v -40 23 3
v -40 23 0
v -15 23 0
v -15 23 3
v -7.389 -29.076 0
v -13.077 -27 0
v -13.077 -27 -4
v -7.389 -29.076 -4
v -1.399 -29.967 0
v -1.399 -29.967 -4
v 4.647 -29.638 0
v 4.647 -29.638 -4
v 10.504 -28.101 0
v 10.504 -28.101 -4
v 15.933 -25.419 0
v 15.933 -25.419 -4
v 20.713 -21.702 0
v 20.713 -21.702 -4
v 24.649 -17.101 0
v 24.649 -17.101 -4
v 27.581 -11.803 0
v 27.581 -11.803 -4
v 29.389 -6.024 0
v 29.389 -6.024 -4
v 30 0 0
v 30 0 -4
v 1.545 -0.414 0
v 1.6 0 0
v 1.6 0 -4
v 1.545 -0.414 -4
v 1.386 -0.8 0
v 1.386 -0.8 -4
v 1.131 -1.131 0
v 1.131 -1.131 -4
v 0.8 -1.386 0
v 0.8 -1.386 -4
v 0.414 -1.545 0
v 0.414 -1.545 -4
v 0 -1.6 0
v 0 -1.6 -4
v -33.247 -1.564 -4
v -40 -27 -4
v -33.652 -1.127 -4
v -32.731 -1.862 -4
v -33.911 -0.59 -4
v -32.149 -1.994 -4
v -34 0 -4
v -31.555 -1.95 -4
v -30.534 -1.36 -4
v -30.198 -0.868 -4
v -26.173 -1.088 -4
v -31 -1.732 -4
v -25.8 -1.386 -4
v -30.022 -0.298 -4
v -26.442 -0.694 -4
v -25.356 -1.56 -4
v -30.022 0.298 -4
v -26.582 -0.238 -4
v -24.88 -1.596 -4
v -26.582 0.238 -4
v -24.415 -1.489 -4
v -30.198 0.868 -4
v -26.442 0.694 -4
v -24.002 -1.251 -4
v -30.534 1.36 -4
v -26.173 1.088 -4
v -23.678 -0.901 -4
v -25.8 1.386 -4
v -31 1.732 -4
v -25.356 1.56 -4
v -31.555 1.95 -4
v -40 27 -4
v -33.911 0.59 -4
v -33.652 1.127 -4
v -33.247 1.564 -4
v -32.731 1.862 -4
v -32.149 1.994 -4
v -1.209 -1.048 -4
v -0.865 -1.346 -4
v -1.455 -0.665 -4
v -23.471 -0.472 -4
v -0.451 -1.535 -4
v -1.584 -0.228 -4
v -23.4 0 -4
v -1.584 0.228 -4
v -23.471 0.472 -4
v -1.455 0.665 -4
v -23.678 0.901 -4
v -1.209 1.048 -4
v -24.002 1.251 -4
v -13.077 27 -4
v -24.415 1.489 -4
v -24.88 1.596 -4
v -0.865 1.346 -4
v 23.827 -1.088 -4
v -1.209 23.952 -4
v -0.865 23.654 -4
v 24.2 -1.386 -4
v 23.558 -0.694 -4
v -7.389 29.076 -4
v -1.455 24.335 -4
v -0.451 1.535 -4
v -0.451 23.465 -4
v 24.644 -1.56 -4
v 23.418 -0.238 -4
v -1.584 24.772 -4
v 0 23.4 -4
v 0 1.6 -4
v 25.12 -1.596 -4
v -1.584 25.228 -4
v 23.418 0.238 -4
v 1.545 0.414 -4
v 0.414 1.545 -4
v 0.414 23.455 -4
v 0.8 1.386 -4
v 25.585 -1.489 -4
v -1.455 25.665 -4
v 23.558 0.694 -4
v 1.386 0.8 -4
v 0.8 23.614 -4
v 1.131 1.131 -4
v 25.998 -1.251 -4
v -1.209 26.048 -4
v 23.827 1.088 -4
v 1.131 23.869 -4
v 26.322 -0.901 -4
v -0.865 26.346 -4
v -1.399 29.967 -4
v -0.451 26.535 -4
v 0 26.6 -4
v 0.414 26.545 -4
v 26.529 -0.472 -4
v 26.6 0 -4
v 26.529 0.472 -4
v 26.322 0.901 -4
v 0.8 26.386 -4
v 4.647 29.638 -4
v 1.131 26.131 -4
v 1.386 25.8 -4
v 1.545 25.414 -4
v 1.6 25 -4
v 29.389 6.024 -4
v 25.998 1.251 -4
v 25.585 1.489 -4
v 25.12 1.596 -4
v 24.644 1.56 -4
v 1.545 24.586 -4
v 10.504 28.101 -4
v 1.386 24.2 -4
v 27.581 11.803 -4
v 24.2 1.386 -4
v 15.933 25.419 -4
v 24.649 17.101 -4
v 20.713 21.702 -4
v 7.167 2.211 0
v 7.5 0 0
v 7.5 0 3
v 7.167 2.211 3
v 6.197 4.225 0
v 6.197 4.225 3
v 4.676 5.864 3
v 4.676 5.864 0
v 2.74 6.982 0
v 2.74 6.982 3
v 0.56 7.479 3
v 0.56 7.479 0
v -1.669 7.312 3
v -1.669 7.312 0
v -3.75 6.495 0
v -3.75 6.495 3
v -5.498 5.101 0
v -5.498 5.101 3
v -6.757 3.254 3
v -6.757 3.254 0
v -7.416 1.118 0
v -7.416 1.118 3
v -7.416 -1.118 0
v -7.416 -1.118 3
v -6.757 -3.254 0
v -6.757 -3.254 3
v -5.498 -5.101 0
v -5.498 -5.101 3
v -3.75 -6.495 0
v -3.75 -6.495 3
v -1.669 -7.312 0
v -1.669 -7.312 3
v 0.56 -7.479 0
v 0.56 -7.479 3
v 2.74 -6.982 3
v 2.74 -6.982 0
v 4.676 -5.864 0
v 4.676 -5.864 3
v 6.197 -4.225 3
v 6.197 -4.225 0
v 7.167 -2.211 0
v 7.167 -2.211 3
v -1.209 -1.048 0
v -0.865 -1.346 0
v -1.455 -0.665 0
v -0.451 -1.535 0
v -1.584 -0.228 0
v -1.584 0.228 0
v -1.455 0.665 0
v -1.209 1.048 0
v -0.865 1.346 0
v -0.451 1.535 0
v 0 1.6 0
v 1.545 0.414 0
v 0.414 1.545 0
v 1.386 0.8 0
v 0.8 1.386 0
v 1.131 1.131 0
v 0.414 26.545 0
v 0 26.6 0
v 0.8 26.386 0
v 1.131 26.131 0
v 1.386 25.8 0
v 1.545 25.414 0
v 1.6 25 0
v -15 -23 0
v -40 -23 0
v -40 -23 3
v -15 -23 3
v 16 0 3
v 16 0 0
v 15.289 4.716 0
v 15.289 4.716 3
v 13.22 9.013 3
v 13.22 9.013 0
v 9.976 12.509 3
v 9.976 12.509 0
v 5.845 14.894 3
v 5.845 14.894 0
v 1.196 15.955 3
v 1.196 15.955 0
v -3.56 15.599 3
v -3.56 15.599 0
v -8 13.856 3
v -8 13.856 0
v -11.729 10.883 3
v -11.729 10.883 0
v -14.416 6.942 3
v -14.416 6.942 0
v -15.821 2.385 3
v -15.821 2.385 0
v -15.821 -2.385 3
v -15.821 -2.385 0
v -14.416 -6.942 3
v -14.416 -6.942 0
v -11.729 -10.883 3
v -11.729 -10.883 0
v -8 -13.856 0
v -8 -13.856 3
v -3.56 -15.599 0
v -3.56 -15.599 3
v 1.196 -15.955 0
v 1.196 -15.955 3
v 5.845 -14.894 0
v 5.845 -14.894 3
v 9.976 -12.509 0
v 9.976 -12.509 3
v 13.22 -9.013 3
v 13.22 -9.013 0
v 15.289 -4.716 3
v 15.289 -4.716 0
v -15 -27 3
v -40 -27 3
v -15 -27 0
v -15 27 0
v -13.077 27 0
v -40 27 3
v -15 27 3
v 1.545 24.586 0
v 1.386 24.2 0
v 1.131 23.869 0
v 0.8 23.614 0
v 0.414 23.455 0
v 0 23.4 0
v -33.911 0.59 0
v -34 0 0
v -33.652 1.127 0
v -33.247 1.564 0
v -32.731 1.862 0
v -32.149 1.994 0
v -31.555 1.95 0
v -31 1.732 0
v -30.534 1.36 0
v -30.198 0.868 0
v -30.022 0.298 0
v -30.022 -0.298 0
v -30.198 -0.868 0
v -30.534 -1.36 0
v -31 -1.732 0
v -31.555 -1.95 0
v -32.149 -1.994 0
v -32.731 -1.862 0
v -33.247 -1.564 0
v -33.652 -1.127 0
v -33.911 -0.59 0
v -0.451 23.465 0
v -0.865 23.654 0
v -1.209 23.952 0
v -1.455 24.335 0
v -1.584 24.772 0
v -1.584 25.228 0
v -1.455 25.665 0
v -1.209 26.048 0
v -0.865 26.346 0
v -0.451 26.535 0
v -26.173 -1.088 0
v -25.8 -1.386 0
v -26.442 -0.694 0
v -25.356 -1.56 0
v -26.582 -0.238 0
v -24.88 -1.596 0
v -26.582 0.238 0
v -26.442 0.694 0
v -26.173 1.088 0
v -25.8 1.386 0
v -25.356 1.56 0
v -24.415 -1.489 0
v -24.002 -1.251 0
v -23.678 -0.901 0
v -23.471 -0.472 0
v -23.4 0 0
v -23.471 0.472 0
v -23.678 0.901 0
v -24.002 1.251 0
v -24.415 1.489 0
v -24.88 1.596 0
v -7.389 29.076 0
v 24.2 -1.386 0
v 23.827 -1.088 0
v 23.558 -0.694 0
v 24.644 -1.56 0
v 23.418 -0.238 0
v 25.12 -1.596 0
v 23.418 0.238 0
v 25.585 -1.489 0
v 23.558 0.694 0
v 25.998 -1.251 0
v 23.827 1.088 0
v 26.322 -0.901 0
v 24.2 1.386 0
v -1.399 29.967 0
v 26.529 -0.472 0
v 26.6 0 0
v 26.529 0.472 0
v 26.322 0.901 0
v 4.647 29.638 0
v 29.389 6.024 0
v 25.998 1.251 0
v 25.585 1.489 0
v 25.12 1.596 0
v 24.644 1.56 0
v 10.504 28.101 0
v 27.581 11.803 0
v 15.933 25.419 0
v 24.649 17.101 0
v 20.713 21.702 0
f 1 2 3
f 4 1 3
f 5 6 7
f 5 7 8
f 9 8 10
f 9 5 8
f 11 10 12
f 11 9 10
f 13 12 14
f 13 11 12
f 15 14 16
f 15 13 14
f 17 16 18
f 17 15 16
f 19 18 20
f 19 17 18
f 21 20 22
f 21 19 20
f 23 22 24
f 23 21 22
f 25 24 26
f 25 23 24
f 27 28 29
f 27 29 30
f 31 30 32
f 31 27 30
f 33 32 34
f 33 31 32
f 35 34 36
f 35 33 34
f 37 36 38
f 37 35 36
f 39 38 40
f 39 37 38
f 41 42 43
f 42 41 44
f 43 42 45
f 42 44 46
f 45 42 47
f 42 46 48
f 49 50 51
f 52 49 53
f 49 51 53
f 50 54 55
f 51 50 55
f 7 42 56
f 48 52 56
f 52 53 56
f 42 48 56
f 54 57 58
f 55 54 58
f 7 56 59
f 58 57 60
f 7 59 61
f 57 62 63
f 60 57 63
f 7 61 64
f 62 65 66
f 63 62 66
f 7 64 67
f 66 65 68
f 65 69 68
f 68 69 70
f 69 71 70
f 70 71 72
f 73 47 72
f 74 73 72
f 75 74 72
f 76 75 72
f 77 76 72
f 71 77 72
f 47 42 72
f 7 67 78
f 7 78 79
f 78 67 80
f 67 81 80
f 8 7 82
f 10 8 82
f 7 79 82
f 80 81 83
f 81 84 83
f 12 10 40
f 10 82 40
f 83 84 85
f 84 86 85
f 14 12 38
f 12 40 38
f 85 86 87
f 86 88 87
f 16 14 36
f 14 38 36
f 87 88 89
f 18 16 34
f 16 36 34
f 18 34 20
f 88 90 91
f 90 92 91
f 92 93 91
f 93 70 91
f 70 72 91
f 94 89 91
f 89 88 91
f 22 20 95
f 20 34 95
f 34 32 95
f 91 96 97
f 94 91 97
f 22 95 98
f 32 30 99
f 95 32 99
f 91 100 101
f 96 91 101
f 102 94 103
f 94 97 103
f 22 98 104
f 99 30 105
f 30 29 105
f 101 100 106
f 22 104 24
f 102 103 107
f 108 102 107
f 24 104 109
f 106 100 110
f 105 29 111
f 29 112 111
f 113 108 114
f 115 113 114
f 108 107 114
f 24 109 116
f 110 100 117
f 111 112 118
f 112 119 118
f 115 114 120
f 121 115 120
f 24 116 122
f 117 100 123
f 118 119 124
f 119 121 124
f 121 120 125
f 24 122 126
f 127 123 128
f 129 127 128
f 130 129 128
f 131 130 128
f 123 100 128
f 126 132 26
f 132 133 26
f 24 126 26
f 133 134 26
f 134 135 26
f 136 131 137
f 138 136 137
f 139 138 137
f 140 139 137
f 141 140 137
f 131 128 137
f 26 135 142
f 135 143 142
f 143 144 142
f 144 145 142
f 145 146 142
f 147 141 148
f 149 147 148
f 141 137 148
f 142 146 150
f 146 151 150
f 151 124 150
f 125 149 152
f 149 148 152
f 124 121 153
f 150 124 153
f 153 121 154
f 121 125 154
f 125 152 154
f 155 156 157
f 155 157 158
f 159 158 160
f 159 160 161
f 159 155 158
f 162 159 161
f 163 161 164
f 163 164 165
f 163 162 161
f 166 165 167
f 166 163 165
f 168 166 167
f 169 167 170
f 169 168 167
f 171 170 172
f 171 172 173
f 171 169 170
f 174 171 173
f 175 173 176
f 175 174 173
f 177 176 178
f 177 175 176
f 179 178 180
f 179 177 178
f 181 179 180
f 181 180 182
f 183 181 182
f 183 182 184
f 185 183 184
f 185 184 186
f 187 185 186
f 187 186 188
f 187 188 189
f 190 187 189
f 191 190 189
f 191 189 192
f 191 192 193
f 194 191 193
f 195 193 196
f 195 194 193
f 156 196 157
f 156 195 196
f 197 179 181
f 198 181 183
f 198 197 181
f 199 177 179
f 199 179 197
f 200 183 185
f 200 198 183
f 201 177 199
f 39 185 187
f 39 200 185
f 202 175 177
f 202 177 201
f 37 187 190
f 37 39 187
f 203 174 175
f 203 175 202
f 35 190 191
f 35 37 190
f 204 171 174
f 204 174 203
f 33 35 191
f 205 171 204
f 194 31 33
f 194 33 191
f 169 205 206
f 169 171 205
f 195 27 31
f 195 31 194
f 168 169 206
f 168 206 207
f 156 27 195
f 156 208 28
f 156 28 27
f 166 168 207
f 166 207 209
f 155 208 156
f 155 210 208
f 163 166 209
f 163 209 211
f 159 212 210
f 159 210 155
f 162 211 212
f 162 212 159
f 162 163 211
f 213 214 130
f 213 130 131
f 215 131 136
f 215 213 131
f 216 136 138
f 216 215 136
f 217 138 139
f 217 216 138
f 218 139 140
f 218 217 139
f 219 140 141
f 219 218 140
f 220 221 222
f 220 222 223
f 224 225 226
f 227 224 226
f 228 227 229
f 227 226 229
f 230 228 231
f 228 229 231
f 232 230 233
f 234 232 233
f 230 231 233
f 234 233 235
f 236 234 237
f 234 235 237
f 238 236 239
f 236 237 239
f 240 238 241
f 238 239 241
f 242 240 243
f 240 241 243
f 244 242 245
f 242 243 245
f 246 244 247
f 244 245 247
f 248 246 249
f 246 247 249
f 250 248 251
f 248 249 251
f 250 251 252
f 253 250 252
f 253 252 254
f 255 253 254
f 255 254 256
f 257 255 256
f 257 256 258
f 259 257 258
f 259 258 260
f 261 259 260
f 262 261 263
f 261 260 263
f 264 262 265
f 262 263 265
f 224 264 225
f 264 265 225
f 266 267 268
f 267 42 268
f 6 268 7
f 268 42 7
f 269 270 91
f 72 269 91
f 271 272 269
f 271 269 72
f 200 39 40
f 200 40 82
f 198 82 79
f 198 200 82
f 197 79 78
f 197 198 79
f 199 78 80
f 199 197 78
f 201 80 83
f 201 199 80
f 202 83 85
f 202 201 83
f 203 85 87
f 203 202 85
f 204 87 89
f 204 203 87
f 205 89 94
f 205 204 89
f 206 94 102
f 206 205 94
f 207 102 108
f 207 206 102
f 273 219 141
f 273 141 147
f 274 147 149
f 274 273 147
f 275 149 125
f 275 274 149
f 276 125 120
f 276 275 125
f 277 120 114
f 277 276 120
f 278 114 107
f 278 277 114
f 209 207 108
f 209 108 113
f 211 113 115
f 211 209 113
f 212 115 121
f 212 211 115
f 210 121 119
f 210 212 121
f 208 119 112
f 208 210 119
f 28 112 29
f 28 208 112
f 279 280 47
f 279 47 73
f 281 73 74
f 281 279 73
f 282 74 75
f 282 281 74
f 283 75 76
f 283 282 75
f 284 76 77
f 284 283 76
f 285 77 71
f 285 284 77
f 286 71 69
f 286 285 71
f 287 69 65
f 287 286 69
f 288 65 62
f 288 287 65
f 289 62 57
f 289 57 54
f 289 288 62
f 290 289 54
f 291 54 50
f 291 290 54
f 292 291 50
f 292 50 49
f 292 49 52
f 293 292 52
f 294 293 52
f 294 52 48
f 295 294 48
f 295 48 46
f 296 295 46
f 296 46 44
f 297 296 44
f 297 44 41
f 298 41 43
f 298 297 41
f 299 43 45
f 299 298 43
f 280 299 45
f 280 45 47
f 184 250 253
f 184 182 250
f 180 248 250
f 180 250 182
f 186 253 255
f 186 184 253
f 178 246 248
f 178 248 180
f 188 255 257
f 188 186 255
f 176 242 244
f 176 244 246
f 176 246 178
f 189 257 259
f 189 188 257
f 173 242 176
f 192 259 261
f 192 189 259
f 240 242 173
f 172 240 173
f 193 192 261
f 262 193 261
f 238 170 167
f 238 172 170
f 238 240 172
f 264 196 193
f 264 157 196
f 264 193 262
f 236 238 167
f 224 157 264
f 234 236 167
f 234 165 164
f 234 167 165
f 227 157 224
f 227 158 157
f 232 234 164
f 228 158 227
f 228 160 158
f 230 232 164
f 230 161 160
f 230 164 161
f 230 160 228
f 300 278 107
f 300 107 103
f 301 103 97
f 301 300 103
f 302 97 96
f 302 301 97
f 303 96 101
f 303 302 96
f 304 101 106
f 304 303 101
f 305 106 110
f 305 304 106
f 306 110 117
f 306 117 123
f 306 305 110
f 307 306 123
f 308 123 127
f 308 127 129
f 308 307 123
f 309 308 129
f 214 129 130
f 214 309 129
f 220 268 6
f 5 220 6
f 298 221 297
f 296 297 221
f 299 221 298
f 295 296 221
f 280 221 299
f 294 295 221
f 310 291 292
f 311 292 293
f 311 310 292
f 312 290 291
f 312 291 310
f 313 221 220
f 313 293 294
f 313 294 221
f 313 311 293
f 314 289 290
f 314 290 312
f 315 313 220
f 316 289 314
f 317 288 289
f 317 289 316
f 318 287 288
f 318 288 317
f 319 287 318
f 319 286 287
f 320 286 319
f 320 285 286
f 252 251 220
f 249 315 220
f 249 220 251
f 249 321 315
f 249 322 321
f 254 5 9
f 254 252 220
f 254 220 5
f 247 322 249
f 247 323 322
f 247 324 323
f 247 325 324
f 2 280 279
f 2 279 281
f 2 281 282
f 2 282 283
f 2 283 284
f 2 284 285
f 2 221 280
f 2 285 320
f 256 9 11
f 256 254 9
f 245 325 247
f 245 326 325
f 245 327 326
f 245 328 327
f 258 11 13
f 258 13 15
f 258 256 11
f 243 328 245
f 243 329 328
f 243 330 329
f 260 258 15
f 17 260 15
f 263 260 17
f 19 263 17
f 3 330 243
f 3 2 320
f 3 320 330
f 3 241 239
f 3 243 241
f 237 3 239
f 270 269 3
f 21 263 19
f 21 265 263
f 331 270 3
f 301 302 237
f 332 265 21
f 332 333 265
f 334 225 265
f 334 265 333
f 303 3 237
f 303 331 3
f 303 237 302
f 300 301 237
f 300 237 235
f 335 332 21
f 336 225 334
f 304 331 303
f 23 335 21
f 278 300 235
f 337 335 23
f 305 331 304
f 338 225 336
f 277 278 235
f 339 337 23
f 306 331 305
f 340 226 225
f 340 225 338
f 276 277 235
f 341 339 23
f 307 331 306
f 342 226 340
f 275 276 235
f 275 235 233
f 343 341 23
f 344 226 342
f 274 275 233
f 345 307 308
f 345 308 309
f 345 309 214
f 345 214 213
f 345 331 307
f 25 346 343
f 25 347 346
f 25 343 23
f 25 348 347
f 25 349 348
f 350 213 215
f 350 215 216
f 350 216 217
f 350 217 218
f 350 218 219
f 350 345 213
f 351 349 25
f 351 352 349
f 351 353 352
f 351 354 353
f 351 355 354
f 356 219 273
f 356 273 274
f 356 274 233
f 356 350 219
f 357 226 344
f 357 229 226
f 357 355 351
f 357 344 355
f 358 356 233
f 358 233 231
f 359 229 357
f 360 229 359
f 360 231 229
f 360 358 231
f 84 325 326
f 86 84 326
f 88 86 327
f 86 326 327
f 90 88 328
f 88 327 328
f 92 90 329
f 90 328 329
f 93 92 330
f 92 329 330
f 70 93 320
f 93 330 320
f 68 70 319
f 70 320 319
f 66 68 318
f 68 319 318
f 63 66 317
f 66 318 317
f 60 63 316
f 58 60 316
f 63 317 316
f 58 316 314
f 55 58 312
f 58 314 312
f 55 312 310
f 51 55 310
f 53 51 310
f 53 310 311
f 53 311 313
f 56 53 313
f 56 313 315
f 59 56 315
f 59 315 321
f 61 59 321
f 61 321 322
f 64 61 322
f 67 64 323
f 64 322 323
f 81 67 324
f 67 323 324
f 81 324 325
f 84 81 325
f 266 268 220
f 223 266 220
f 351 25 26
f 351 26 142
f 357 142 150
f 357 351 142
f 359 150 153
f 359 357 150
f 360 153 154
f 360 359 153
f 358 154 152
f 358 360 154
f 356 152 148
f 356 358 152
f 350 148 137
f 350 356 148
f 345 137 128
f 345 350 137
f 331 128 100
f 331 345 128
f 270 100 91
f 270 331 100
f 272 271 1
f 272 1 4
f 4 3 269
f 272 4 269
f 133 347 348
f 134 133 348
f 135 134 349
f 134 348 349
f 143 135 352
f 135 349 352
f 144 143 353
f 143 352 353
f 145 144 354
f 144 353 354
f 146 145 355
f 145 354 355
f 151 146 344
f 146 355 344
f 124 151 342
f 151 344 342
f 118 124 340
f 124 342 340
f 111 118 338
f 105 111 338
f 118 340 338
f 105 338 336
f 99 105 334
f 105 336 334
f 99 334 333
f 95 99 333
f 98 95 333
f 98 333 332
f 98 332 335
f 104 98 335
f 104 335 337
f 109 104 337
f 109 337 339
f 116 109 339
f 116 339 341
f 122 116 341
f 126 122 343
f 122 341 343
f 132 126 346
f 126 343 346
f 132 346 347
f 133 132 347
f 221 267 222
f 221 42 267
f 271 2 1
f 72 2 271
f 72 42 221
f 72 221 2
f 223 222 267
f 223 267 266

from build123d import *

# Parameters (mm, degrees)
F0_R     = 1.6
F1_DEPTH = 4
F2_R     = 16
F2_R_2   = 7.5
F2_W     = 25
F2_H     = 4
F3_DEPTH = 3


with BuildPart() as f1:
    # F0 (on Top) → F1 (new body)
    with BuildSketch(Plane.XY):
        with BuildLine():
            ThreePointArc((0, 1.6), (1.1313708499, 1.1313708499), (1.6, 0))
            ThreePointArc((1.6, 0), (1.1313708499, -1.1313708499), (0, -1.6))
            Line((0, -1.6), (0, -27))
            Line((0, -27), (-13.0766968306, -27))
            ThreePointArc((-13.0766968306, -27), (15.9326566379, -25.4194896184), (30, 0))
            ThreePointArc((30, 0), (15.9326566379, 25.4194896184), (-13.0766968306, 27))
            Line((-13.0766968306, 27), (0, 27))
            Line((0, 27), (0, 26.6))
            ThreePointArc((0, 26.6), (1.1313708499, 26.1313708499), (1.6, 25))
            ThreePointArc((1.6, 25), (1.1313708499, 23.8686291501), (0, 23.4))
            Line((0, 23.4), (0, 1.6))
        make_face()
        with Locations((25, 0)):
            Circle(F0_R, mode=Mode.SUBTRACT)
        with BuildLine():
            ThreePointArc((0, -1.6), (-1.6, 0), (0, 1.6))
            Line((0, 1.6), (0, 23.4))
            ThreePointArc((0, 23.4), (-1.6, 25), (0, 26.6))
            Line((0, 26.6), (0, 27))
            Line((0, 27), (-13.0766968306, 27))
            ThreePointArc((-13.0766968306, 27), (-25.4194896184, 15.9326566379), (-30, 0))
            ThreePointArc((-30, 0), (-25.4194896184, -15.9326566379), (-13.0766968306, -27))
            Line((-13.0766968306, -27), (0, -27))
            Line((0, -27), (0, -1.6))
        make_face()
        with Locations((-25, 0)):
            Circle(F0_R, mode=Mode.SUBTRACT)
        with BuildLine():
            Line((-40, -27), (-13.0766968306, -27))
            ThreePointArc((-13.0766968306, -27), (-25.4194896184, -15.9326566379), (-30, 0))
            ThreePointArc((-30, 0), (-32, -2), (-34, 0))
            Line((-34, 0), (-40, 0))
            Line((-40, 0), (-40, -27))
        make_face()
        with BuildLine():
            ThreePointArc((-34, 0), (-32, 2), (-30, 0))
            ThreePointArc((-30, 0), (-25.4194896184, 15.9326566379), (-13.0766968306, 27))
            Line((-13.0766968306, 27), (-40, 27))
            Line((-40, 27), (-40, 0))
            Line((-40, 0), (-34, 0))
        make_face()
    extrude(amount=-F1_DEPTH)

    # F2 (on Top) → F3 (join)
    with BuildSketch(Plane.XY):
        Circle(F2_R)
        Circle(F2_R_2, mode=Mode.SUBTRACT)
        with Locations((-27.5, -25)):
            Rectangle(F2_W, F2_H)
        with Locations((-27.5, 25)):
            Rectangle(F2_W, F2_H)
    extrude(amount=F3_DEPTH)


solid = f1.part
